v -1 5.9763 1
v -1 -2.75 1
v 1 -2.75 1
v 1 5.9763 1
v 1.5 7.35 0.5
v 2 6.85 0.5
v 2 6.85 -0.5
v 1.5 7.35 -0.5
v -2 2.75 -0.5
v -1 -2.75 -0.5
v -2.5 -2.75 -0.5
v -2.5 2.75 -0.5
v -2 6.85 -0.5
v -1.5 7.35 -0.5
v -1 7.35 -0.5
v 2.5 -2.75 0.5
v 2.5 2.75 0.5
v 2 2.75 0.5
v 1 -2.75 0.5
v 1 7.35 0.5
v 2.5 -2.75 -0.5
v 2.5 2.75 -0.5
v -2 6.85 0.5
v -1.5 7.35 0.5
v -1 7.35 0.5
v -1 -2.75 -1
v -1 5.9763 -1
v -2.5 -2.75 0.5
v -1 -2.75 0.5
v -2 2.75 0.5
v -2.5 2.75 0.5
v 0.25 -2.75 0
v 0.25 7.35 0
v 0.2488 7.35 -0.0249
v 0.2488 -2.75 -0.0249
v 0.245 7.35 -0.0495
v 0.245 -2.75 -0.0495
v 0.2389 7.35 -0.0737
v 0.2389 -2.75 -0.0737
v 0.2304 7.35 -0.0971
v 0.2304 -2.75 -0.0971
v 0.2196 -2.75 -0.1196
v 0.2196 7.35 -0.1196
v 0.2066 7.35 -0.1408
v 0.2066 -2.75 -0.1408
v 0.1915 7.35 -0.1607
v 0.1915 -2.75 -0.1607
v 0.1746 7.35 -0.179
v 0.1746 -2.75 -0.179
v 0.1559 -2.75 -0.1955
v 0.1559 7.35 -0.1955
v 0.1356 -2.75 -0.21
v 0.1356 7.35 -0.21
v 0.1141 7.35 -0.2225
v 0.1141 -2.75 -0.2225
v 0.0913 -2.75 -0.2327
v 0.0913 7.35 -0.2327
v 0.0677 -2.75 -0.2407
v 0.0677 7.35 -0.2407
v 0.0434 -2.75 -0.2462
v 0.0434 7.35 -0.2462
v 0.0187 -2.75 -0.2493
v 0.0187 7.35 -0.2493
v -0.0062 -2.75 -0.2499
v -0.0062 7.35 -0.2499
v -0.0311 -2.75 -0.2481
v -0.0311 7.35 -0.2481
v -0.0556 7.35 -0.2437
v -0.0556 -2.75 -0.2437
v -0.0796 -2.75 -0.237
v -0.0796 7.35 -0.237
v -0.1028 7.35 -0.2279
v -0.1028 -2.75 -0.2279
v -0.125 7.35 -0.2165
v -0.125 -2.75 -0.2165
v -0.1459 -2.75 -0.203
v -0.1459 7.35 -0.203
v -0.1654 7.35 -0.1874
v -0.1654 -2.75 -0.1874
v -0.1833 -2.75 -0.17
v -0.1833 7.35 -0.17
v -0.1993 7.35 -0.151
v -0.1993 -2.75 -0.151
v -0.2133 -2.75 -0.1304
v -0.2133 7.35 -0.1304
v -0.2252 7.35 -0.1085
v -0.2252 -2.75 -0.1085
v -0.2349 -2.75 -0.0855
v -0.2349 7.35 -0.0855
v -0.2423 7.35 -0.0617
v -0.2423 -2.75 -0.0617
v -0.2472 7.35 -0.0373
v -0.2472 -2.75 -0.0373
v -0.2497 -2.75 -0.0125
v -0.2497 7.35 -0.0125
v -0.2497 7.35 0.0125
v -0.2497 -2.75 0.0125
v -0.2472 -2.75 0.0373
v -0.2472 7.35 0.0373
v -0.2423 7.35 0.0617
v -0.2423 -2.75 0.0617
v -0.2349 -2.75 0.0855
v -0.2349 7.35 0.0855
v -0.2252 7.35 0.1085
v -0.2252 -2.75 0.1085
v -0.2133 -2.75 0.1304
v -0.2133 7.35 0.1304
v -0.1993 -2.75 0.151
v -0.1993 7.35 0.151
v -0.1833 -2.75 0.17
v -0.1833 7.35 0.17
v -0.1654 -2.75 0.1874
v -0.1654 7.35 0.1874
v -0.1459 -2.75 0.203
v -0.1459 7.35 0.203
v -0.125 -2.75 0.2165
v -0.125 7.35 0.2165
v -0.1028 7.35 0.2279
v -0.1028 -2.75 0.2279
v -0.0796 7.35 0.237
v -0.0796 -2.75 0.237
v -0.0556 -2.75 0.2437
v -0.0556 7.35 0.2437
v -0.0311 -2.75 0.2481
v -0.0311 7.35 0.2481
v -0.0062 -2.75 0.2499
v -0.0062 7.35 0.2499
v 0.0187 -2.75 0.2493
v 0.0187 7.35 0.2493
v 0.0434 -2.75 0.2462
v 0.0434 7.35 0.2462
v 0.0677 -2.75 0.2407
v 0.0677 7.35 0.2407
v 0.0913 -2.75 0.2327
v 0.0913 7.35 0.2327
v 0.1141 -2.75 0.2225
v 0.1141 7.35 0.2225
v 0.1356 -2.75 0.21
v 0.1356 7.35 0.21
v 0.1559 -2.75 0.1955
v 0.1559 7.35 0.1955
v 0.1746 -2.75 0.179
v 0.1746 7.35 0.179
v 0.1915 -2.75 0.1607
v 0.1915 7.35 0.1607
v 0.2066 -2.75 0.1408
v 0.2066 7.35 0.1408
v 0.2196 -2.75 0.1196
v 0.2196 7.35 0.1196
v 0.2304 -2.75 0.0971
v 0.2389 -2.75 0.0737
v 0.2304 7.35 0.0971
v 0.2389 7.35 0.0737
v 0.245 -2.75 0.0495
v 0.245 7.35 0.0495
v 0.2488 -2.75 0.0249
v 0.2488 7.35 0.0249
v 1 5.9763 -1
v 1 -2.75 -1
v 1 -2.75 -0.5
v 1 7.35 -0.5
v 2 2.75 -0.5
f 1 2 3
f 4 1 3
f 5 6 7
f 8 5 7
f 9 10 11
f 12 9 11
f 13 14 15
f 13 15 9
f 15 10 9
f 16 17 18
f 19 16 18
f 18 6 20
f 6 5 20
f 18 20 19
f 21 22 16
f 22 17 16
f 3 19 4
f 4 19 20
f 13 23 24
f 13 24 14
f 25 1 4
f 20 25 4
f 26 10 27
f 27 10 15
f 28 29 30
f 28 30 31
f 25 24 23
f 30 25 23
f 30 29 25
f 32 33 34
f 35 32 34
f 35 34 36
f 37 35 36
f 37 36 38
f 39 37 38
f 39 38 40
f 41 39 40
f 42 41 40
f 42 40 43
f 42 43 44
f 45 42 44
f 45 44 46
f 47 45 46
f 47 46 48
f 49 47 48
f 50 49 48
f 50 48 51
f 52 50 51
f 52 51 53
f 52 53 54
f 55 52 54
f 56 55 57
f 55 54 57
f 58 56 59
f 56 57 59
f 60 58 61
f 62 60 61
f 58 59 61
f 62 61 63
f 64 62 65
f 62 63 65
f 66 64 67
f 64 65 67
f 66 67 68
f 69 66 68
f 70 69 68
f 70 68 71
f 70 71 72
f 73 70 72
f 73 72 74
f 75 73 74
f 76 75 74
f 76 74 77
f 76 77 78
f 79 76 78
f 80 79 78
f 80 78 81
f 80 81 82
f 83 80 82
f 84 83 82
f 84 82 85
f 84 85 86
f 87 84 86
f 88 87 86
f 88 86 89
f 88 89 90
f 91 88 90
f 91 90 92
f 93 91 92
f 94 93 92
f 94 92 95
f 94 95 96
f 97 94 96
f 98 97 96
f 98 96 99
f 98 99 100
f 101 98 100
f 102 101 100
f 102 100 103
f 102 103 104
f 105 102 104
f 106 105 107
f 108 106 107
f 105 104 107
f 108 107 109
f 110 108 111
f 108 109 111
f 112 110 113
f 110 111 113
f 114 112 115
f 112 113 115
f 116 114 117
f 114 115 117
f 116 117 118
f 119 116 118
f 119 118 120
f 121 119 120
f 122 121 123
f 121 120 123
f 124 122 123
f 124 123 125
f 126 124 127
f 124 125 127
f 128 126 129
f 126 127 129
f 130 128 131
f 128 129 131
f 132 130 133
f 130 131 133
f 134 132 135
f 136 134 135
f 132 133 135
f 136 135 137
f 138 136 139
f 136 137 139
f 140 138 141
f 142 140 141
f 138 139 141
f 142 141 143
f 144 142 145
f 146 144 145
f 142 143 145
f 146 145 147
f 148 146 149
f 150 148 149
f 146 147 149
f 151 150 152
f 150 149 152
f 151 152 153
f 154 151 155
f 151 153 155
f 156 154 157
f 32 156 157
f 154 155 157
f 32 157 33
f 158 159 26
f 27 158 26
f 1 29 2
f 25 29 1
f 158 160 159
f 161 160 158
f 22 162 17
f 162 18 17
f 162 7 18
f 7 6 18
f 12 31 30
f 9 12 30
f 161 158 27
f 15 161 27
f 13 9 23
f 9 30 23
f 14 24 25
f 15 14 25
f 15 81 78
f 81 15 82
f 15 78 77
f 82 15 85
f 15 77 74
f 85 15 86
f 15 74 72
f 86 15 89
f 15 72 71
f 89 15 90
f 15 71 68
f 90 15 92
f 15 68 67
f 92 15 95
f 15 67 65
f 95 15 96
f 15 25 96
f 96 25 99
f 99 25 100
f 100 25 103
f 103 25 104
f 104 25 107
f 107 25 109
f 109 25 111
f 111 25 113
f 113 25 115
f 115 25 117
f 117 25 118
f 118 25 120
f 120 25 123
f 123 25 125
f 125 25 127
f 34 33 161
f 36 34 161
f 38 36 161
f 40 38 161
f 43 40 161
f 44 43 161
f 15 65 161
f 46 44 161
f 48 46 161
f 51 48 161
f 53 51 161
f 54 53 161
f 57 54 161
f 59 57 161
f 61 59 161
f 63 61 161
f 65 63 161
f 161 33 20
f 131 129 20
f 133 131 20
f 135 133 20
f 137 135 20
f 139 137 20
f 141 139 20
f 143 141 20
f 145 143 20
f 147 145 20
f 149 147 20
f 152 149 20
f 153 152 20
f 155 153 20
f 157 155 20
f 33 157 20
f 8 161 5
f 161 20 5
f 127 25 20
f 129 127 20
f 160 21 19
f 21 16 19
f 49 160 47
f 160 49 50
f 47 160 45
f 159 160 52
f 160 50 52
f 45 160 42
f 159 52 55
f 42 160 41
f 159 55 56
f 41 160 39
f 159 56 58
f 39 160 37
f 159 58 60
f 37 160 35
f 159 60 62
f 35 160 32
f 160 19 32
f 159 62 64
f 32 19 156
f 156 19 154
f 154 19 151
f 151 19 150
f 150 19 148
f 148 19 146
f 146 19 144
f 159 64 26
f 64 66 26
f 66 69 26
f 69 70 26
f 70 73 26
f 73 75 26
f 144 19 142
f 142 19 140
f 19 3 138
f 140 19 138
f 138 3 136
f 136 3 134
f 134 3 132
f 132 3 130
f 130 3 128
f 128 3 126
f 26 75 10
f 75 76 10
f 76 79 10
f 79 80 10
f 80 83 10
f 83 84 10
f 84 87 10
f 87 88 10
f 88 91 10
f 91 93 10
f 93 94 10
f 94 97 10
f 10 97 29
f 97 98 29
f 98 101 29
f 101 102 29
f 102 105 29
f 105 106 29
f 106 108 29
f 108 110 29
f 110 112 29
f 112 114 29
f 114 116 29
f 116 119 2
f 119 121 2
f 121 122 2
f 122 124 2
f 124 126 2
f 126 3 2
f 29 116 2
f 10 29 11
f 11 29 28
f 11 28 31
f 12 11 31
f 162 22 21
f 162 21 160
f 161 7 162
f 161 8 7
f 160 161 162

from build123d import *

# Parameters (mm, degrees)
AUFSATZ_LINEAR_AUSTRAGEN1_DEPTH = 0.5
SKIZZE2_W                       = 2
SKIZZE2_H                       = 10.1
AUFSATZ_LINEAR_AUSTRAGEN2_DEPTH = 0.5
FASE1_SIZE                      = 0.5
FASE1_SIZE2                     = 1.37373871
SKIZZE3_W                       = 2
SKIZZE3_H                       = 10.1
AUFSATZ_LINEAR_AUSTRAGEN3_DEPTH = 0.5
FASE3_SIZE                      = 0.5
FASE3_SIZE2                     = 1.37373871
FASE4_SIZE                      = 0.5
FASE5_SIZE                      = 0.5
SKIZZE4_R                       = 0.25
SCHNITT_LINEAR_AUSTRAGEN1_DEPTH = 11.1


with BuildPart() as part:
    # Skizze1 → Aufsatz-Linear austragen1 (new body, symmetric)
    with BuildSketch(Plane.XY):
        Polygon((-2, 2.75), (-2, 7.35), (2, 7.35), (2, 2.75), (2.5, 2.75), (2.5, -2.75), (-2.5, -2.75), (-2.5, 2.75), align=None)
    extrude(amount=AUFSATZ_LINEAR_AUSTRAGEN1_DEPTH, both=True)

    # Skizze2 → Aufsatz-Linear austragen2 (add)
    with BuildSketch(Plane.XY.offset(0.5)):
        with Locations((0, 2.3)):
            Rectangle(SKIZZE2_W, SKIZZE2_H)
    extrude(amount=AUFSATZ_LINEAR_AUSTRAGEN2_DEPTH)

    # Fase1
    fase1_edges = [part.edges().sort_by_distance(p)[0] for p in [
        (0, 7.35, 1),
    ]]
    fase1_side = [part.faces().sort_by_distance(p)[0] for p in [
        (0, 7.35, 0.15),
    ]]
    chamfer(fase1_edges, length=FASE1_SIZE, length2=FASE1_SIZE2, reference=fase1_side[0])

    # Skizze3 → Aufsatz-Linear austragen3 (add)
    with BuildSketch(Plane(origin=(0, 0, -0.5), x_dir=(-1, 0, 0), z_dir=(0, 0, -1))):
        with Locations((0, 2.3)):
            Rectangle(SKIZZE3_W, SKIZZE3_H)
    extrude(amount=AUFSATZ_LINEAR_AUSTRAGEN3_DEPTH)

    # Fase3
    fase3_edges = [part.edges().sort_by_distance(p)[0] for p in [
        (0, 7.35, -1),
    ]]
    fase3_side = [part.faces().sort_by_distance(p)[0] for p in [
        (0, 7.35, -0.15),
    ]]
    chamfer(fase3_edges, length=FASE3_SIZE, length2=FASE3_SIZE2, reference=fase3_side[0])

    # Fase4
    fase4_edges = [part.edges().sort_by_distance(p)[0] for p in [
        (-2, 7.35, 0),
    ]]
    chamfer(fase4_edges, length=FASE4_SIZE)

    # Fase5
    fase5_edges = [part.edges().sort_by_distance(p)[0] for p in [
        (2, 7.35, 0),
    ]]
    chamfer(fase5_edges, length=FASE5_SIZE)

    # Skizze4 → Schnitt-Linear austragen1 (cut, through all)
    with BuildSketch(Plane(origin=(0, 7.35, 0), x_dir=(1, 0, 0), z_dir=(0, 1, 0))):
        Circle(SKIZZE4_R)
    extrude(amount=-SCHNITT_LINEAR_AUSTRAGEN1_DEPTH, mode=Mode.SUBTRACT)


solid = part.part
